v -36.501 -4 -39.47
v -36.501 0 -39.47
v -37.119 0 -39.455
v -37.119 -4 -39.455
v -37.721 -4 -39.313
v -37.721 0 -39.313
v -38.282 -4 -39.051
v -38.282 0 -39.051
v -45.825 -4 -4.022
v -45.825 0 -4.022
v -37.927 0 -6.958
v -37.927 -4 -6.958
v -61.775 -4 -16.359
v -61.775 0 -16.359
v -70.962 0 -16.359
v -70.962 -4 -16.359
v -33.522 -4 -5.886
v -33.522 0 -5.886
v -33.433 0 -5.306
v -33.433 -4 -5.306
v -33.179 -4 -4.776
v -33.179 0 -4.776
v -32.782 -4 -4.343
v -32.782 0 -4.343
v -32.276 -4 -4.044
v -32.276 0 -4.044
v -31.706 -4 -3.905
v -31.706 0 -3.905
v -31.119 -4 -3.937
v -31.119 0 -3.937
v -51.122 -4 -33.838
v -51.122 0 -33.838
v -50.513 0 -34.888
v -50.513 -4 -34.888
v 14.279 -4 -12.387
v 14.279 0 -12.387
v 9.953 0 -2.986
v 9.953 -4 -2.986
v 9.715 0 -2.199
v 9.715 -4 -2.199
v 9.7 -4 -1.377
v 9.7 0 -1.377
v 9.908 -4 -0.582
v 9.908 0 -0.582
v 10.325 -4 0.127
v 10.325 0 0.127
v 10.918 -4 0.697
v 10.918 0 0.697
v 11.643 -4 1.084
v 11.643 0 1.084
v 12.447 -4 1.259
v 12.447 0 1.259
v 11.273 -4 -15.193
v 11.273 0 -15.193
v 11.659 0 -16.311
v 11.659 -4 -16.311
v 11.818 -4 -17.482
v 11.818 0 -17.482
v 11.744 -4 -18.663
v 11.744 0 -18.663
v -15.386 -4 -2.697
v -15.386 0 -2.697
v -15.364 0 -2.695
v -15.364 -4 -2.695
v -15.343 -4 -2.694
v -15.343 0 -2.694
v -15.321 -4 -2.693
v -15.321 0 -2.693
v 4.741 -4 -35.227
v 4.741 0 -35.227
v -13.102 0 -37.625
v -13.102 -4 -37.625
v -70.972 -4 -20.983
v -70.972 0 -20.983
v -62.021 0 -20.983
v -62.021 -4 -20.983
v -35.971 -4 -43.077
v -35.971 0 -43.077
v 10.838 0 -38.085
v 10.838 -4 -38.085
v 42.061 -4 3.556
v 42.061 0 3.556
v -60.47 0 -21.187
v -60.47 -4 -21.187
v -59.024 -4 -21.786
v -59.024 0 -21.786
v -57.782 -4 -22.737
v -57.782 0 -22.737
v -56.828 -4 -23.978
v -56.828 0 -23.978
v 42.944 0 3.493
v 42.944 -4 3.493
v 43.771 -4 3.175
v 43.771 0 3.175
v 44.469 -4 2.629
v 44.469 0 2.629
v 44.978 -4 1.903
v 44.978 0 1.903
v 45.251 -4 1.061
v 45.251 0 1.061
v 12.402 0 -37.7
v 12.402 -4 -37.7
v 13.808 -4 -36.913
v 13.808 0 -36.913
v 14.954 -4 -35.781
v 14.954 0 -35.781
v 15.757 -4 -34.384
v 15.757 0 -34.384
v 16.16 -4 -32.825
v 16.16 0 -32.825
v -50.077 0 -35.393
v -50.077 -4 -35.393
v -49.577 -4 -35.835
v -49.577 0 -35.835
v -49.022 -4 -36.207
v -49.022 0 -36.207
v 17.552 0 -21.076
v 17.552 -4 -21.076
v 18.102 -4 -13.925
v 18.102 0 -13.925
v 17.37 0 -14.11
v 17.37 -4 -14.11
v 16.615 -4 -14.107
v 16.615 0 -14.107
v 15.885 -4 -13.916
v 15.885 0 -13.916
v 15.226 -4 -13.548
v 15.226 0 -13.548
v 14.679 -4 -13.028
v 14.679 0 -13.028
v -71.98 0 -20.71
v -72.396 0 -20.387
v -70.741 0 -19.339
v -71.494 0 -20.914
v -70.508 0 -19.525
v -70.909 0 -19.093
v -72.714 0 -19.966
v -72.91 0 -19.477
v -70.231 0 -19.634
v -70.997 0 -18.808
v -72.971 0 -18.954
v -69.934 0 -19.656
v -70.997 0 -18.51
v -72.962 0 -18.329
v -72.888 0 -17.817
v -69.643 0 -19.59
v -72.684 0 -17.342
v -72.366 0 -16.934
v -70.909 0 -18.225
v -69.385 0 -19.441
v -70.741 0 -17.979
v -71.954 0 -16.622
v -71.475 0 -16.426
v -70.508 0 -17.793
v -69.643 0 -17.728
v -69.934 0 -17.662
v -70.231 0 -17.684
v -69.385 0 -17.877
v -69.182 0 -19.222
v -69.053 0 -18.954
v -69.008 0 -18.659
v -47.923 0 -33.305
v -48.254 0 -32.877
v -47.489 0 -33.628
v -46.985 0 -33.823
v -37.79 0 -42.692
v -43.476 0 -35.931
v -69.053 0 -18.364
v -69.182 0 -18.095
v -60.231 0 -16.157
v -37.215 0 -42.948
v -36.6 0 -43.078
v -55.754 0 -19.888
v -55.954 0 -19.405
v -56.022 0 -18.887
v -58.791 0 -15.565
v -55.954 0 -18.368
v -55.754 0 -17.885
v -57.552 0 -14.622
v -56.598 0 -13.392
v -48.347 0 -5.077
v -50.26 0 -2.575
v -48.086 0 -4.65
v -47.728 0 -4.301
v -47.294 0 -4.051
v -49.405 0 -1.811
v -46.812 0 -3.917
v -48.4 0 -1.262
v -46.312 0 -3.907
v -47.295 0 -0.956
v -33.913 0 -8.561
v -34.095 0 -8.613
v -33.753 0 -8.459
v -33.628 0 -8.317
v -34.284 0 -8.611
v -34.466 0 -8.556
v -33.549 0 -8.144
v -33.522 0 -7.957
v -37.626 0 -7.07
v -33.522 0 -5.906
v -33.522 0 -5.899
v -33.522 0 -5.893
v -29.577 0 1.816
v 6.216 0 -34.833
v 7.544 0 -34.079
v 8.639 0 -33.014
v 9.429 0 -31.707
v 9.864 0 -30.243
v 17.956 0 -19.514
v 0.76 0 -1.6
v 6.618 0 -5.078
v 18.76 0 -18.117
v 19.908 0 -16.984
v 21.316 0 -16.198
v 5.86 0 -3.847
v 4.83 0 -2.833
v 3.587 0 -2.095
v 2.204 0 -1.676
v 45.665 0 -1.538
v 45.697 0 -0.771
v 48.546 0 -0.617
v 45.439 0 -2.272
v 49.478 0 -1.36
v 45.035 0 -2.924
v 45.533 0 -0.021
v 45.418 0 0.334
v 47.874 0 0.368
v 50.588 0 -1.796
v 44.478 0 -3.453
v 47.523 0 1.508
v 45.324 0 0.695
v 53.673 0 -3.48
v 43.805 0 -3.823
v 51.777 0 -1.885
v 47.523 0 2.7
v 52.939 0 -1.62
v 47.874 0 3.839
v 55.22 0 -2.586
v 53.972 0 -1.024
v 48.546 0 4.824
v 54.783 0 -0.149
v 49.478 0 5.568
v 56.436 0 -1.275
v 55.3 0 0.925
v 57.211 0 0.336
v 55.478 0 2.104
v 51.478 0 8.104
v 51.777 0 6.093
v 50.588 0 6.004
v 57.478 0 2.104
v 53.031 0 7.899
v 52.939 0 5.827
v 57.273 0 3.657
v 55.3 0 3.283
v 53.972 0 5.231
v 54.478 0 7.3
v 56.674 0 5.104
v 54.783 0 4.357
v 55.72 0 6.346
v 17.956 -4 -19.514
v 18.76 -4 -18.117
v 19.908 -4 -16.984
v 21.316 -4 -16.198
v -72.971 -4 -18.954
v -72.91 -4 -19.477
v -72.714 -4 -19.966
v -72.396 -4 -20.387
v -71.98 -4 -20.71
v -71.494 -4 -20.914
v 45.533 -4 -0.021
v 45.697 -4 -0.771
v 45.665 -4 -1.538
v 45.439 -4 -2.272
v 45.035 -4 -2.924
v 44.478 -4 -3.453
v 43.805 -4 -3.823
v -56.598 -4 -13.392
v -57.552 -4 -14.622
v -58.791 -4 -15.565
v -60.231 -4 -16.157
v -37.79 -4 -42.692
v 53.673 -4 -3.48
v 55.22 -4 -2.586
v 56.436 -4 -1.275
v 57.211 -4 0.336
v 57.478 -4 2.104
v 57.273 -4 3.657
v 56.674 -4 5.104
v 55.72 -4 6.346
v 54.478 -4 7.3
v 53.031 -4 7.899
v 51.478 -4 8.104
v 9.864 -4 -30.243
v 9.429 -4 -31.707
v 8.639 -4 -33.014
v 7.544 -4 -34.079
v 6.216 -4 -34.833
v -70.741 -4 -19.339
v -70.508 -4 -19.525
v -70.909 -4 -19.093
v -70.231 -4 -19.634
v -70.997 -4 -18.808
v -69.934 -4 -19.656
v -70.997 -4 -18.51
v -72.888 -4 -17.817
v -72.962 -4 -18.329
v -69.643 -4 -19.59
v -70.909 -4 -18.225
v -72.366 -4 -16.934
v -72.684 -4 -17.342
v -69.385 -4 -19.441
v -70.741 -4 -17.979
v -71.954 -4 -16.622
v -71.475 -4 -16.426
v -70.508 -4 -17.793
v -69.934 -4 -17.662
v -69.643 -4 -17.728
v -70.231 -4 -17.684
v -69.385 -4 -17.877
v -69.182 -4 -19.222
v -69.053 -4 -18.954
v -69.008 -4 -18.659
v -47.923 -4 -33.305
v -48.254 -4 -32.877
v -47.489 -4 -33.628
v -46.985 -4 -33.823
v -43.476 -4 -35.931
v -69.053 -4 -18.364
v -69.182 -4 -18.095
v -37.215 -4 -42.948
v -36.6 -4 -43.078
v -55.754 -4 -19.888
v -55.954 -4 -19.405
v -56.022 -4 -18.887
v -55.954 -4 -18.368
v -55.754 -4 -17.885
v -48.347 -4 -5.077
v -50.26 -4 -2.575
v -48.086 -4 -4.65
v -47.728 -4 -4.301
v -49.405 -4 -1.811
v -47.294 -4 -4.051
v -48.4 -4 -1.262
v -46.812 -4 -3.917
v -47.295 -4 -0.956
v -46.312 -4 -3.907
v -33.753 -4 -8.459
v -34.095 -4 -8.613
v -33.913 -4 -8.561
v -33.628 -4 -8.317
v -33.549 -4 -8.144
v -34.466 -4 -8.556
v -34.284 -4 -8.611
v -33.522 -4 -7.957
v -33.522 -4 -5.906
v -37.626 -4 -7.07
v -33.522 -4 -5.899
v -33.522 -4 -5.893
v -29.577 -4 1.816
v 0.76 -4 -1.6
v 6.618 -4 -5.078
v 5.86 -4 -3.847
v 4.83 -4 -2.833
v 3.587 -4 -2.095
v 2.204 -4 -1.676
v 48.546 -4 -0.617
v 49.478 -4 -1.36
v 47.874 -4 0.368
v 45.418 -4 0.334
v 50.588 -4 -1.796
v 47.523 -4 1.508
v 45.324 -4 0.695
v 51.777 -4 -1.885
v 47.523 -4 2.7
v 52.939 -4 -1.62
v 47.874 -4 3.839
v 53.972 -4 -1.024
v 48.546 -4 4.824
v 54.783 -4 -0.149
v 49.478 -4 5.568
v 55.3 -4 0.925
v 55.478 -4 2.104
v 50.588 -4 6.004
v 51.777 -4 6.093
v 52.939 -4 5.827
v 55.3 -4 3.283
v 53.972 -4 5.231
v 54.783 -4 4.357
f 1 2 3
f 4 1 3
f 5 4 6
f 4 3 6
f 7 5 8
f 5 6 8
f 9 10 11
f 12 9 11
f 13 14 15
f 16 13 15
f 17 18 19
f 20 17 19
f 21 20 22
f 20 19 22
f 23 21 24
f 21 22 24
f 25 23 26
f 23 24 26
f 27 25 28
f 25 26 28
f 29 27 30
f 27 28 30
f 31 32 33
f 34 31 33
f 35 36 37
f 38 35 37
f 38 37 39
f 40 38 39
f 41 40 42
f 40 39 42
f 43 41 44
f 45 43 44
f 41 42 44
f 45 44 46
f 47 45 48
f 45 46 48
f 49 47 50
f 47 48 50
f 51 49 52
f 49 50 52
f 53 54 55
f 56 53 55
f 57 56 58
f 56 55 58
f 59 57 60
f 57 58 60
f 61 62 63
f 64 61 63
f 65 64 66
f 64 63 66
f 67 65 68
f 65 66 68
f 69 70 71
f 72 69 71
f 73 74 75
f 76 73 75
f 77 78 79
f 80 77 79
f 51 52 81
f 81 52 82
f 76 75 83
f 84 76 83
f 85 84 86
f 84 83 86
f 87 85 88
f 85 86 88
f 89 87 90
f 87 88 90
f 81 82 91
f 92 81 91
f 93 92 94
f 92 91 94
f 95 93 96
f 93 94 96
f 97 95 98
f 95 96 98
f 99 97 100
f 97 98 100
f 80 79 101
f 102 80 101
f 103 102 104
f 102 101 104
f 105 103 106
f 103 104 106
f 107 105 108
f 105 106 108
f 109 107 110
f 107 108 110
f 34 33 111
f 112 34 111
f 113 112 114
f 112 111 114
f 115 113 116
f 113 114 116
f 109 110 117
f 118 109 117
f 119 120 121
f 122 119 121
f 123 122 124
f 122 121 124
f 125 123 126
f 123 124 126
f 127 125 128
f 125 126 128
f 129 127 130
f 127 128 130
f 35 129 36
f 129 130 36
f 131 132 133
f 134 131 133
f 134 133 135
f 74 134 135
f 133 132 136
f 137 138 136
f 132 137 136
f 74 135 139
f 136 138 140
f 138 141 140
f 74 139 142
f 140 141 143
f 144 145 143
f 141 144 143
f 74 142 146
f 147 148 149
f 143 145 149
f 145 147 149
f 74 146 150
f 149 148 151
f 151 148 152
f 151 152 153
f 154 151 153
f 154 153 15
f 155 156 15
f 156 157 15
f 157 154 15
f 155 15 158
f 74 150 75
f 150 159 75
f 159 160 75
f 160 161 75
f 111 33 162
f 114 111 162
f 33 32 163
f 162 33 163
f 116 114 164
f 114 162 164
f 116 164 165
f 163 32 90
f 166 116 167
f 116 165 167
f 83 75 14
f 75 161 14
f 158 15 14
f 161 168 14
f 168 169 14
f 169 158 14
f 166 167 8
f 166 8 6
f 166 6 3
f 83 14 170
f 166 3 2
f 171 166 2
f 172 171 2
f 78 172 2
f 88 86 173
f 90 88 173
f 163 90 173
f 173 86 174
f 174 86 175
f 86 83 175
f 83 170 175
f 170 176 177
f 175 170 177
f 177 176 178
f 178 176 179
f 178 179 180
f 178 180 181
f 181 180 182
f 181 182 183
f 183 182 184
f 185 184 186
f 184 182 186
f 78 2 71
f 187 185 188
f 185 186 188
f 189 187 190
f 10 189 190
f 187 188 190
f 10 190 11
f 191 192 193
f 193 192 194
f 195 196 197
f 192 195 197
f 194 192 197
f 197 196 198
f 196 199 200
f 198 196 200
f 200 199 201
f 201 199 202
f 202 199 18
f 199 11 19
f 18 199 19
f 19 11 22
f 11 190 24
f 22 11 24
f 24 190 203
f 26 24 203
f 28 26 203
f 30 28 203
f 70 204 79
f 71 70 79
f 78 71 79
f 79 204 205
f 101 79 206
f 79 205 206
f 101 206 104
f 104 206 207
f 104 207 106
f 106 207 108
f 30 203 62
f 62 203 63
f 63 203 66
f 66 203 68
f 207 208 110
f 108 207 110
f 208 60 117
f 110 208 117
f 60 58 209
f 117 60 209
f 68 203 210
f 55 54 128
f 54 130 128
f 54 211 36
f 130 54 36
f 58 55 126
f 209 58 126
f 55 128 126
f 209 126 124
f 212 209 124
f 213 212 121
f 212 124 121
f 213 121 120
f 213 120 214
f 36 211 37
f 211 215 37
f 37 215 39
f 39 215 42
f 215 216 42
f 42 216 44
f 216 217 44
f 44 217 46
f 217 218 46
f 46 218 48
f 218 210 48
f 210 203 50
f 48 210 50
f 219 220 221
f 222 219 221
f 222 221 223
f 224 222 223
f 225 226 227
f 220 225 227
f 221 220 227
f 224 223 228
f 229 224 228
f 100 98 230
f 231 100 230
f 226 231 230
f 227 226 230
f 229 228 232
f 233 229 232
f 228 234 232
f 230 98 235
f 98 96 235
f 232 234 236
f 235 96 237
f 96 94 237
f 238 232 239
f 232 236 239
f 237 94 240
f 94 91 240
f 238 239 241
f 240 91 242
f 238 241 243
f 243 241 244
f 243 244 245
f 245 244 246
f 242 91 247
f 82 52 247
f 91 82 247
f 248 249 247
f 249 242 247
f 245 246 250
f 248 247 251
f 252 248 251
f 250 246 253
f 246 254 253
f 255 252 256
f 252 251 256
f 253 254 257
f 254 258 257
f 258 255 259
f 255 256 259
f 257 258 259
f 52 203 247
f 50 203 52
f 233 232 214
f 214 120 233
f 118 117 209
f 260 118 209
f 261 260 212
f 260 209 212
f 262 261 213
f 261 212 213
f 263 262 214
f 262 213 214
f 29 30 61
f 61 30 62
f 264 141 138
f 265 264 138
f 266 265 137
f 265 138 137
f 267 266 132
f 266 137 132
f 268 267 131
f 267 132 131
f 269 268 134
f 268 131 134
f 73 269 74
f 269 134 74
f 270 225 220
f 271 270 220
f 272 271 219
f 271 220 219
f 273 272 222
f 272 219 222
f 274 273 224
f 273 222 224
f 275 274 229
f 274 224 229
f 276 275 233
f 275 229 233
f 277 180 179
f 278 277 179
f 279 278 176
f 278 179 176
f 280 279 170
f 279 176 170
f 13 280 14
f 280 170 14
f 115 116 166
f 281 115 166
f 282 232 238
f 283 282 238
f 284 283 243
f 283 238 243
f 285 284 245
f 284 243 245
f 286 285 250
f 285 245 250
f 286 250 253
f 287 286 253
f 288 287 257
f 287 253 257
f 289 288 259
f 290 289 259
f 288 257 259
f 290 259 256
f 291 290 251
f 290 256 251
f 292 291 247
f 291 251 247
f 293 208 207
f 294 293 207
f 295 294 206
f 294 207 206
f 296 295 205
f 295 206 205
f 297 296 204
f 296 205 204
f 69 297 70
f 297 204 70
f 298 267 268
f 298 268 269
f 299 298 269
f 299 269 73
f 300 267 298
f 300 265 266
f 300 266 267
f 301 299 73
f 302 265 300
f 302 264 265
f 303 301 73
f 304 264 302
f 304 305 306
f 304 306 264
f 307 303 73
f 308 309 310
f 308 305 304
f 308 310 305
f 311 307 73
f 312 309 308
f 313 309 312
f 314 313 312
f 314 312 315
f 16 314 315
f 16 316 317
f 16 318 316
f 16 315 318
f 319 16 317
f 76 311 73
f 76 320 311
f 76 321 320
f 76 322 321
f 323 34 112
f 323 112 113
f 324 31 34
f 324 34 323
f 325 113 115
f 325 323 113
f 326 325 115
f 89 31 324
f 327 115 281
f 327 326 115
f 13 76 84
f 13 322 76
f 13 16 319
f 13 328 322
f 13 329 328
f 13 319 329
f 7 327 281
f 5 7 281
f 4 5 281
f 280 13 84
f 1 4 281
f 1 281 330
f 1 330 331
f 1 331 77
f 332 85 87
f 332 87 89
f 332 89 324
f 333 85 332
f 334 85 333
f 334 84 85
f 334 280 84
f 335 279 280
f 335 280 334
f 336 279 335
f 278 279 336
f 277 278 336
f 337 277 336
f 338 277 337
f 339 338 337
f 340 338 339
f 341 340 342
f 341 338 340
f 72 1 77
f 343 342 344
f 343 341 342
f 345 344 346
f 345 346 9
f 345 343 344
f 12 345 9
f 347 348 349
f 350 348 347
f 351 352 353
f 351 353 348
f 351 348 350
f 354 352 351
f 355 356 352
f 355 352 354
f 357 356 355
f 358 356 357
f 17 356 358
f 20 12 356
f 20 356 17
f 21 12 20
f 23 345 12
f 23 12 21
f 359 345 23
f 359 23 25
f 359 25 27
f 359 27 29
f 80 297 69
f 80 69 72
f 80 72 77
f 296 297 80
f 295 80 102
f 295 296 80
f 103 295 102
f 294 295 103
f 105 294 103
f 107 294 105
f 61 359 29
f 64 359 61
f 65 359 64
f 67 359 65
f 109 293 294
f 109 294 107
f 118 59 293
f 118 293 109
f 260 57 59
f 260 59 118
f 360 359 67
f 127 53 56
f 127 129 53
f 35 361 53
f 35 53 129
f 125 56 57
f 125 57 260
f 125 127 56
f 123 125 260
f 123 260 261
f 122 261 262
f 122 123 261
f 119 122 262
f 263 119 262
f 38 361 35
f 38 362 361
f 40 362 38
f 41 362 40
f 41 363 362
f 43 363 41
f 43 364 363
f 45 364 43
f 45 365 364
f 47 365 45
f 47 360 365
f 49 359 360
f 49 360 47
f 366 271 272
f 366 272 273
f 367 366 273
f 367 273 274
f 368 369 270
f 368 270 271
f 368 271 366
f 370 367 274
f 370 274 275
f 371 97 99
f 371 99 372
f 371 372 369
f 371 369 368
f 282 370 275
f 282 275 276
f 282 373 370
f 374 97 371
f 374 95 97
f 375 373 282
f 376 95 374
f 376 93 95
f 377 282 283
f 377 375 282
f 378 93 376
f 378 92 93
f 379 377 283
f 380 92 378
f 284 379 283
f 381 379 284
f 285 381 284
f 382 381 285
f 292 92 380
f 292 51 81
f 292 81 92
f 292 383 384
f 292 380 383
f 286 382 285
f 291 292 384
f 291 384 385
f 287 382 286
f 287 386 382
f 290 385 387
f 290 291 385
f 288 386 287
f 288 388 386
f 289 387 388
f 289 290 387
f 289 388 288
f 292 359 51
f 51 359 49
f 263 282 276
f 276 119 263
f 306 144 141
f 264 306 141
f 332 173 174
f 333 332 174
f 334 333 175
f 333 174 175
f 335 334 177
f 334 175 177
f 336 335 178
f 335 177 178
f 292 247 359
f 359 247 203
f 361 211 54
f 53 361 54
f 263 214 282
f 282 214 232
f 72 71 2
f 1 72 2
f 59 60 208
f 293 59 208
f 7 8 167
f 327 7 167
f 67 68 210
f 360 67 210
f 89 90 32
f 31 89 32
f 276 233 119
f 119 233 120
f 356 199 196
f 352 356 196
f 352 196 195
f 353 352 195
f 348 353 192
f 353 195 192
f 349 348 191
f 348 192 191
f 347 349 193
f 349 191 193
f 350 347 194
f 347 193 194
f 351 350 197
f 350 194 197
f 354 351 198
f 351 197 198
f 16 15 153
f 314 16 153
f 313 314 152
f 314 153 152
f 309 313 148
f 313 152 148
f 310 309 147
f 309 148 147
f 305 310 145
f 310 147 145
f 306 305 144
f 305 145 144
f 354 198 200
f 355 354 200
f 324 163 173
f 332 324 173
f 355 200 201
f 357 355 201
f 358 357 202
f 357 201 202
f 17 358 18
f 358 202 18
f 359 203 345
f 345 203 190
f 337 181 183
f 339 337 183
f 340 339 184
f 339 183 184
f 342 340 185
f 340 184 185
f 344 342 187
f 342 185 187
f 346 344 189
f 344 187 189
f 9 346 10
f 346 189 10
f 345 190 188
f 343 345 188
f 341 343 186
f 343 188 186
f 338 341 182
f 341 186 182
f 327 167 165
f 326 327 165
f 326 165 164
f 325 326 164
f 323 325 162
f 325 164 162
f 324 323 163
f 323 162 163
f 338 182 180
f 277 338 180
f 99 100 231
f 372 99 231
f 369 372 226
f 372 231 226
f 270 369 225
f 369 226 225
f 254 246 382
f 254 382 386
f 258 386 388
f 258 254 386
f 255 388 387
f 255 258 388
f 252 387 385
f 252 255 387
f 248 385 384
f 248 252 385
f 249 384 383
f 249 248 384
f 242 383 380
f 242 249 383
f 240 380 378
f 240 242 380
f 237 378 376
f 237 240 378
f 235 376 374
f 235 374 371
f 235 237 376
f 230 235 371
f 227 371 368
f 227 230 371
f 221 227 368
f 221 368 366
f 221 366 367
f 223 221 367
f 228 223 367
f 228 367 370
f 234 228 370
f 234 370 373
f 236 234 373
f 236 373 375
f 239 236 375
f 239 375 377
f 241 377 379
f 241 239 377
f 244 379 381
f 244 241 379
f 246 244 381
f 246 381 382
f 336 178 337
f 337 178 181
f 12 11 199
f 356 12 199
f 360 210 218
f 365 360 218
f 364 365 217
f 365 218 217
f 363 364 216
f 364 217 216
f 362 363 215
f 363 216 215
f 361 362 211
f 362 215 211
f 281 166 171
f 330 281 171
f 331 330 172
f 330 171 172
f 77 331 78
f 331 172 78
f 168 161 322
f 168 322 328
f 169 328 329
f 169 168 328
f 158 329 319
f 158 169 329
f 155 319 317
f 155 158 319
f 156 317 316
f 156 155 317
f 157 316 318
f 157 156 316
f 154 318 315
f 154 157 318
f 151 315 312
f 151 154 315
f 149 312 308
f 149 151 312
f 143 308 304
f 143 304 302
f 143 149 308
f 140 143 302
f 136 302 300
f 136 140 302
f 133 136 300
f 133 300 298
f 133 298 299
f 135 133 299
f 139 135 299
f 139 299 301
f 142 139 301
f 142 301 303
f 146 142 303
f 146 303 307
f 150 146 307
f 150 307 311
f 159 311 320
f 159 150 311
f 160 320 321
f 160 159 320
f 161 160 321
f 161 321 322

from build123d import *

# Parameters (mm, degrees)
F1_R     = 1
F1_R_2   = 4
F2_DEPTH = 4


# Not quite as in the source:
# - a feature names something its author has since deleted; it is built from what else it names


with BuildPart() as f2:
    # F1 (on Front) → F2 (new body)
    with BuildSketch(Plane.XZ):
        with BuildLine():
            ThreePointArc((53.6725900561, -3.4803708923), (56.4360817028, -1.2749098512), (57.4778270766, 2.1038045583))
            ThreePointArc((57.4778270766, 2.1038045583), (55.7204672392, 6.3464457699), (51.4778255932, 8.1038045583))
            Line((51.4778255932, 8.1038045583), (-29.5767494715, 1.8164854333))
            Line((-29.5767494715, 1.8164854333), (-47.2952228074, -0.9563085456))
            ThreePointArc((-47.2952228074, -0.9563085456), (-48.9181443858, -1.5076422035), (-50.2595064205, -2.5746900675))
            Line((-50.2595064205, -2.5746900675), (-56.5978536574, -13.3921147633))
            ThreePointArc((-56.5978536574, -13.3921147633), (-58.7913353541, -15.5645829823), (-61.7746472195, -16.3588313254))
            Line((-61.7746472195, -16.3588313254), (-70.9623719458, -16.3588313254))
            ThreePointArc((-70.9623719458, -16.3588313254), (-72.3660357626, -16.9341461359), (-72.9621509967, -18.3291034361))
            Line((-72.9621509967, -18.3291034361), (-72.9714351561, -18.9536438246))
            ThreePointArc((-72.9714351561, -18.9536438246), (-72.3963412947, -20.3870355307), (-70.9716561052, -20.9833717139))
            Line((-70.9716561052, -20.9833717139), (-62.0211355409, -20.9833717139))
            ThreePointArc((-62.0211355409, -20.9833717139), (-59.0238889239, -21.7856305971), (-56.8281648814, -23.977867475))
            Line((-56.8281648814, -23.977867475), (-51.1217613336, -33.8375062708))
            Line((-51.1217613336, -33.8375062708), (-50.5134866975, -34.8884954183))
            ThreePointArc((-50.5134866975, -34.8884954183), (-49.834113752, -35.622752626), (-49.0221729234, -36.2070755993))
            Line((-49.0221729234, -36.2070755993), (-37.7895467449, -42.6922353472))
            ThreePointArc((-37.7895467449, -42.6922353472), (-36.9110233024, -43.029081092), (-35.9713694581, -43.0772386209))
            Line((-35.9713694581, -43.0772386209), (10.8377953956, -38.0845412605))
            ThreePointArc((10.8377953956, -38.0845412605), (14.4191592098, -36.3857997297), (16.1597362046, -32.824580657))
            Line((16.1597362046, -32.824580657), (17.5522645357, -21.0756224064))
            ThreePointArc((17.5522645357, -21.0756224064), (18.760112016, -18.1166816586), (21.3157969388, -16.1976453223))
            Line((21.3157969388, -16.1976453223), (53.6725900561, -3.4803708923))
        make_face()
        with Locations((-70.0084173118, -18.6587822488)):
            Circle(F1_R, mode=Mode.SUBTRACT)
        with BuildLine():
            ThreePointArc((-33.5221489054, -5.8863848639), (-32.7820426942, -4.3428905644), (-31.1190403454, -3.9372367165))
            Line((-31.1190403454, -3.9372367165), (-15.3857114758, -2.6969403245))
            ThreePointArc((-15.3857114758, -2.6969403245), (-15.3533597704, -2.6945658839), (-15.320984282, -2.6925413929))
            Line((-15.320984282, -2.6925413929), (0.7603415418, -1.5996367209))
            ThreePointArc((0.7603415418, -1.5996367209), (4.2304854801, -2.4267493449), (6.6177460931, -5.0775984562))
            Line((6.6177460931, -5.0775984562), (11.2725159026, -15.1927708333))
            ThreePointArc((11.2725159026, -15.1927708333), (11.7672314644, -16.8926047847), (11.7443467828, -18.6628181167))
            Line((11.7443467828, -18.6628181167), (9.8637327358, -30.2427322728))
            ThreePointArc((9.8637327358, -30.2427322728), (8.1254532697, -33.5812724587), (4.7405491326, -35.2274468291))
            Line((4.7405491326, -35.2274468291), (-13.1016644536, -37.6254695609))
            Line((-13.1016644536, -37.6254695609), (-36.5010263621, -39.4700978904))
            ThreePointArc((-36.5010263621, -39.4700978904), (-37.4240833549, -39.3995872417), (-38.2816944982, -39.0510057009))
            Line((-38.2816944982, -39.0510057009), (-43.475593846, -35.9307785793))
            Line((-43.475593846, -35.9307785793), (-46.9845830439, -33.8227586638))
            ThreePointArc((-46.9845830439, -33.8227586638), (-47.7169758073, -33.480833261), (-48.2542237632, -32.8769485246))
            Line((-48.2542237632, -32.8769485246), (-55.7535278454, -19.8877718654))
            ThreePointArc((-55.7535278454, -19.8877718654), (-56.0221729234, -18.8865675237), (-55.7535278454, -17.8853631819))
            Line((-55.7535278454, -17.8853631819), (-48.3466238348, -5.0768093424))
            ThreePointArc((-48.3466238348, -5.0768093424), (-47.2942991525, -4.0512417288), (-45.8251853322, -4.0215642922))
            Line((-45.8251853322, -4.0215642922), (-37.9265817129, -6.9582780391))
            Line((-37.9265817129, -6.9582780391), (-37.6259790546, -7.0700425992))
            Line((-37.6259790546, -7.0700425992), (-34.4656276648, -8.5558833842))
            ThreePointArc((-34.4656276648, -8.5558833842), (-33.8292769309, -8.5156852397), (-33.5221489054, -7.9569093245))
            Line((-33.5221489054, -7.9569093245), (-33.5221489054, -5.9059880699))
            ThreePointArc((-33.5221489054, -5.9059880699), (-33.5221729234, -5.8961864669), (-33.5221489054, -5.8863848639))
        make_face(mode=Mode.SUBTRACT)
        with BuildLine():
            ThreePointArc((9.9534750477, -2.9862699605), (10.0919340096, -0.2128411234), (12.4467532901, 1.2588601217))
            Line((12.4467532901, 1.2588601217), (42.0606238873, 3.555977278))
            ThreePointArc((42.0606238873, 3.555977278), (44.1407275048, 2.9281273611), (45.2513978552, 1.0606590347))
            ThreePointArc((45.2513978552, 1.0606590347), (45.3681686541, 0.5136324312), (45.5329001833, -0.0209113441))
            ThreePointArc((45.5329001833, -0.0209113441), (45.4391256015, -2.2717054042), (43.8052859559, -3.8226520781))
            Line((43.8052859559, -3.8226520781), (18.1020868014, -13.9248471934))
            ThreePointArc((18.1020868014, -13.9248471934), (15.884946368, -13.9159482702), (14.2794171364, -12.3868744398))
            Line((14.2794171364, -12.3868744398), (9.9534750477, -2.9862699605))
        make_face(mode=Mode.SUBTRACT)
        with Locations((51.4778270766, 2.1038045583)):
            Circle(F1_R_2, mode=Mode.SUBTRACT)
    extrude(amount=F2_DEPTH)


solid = f2.part
